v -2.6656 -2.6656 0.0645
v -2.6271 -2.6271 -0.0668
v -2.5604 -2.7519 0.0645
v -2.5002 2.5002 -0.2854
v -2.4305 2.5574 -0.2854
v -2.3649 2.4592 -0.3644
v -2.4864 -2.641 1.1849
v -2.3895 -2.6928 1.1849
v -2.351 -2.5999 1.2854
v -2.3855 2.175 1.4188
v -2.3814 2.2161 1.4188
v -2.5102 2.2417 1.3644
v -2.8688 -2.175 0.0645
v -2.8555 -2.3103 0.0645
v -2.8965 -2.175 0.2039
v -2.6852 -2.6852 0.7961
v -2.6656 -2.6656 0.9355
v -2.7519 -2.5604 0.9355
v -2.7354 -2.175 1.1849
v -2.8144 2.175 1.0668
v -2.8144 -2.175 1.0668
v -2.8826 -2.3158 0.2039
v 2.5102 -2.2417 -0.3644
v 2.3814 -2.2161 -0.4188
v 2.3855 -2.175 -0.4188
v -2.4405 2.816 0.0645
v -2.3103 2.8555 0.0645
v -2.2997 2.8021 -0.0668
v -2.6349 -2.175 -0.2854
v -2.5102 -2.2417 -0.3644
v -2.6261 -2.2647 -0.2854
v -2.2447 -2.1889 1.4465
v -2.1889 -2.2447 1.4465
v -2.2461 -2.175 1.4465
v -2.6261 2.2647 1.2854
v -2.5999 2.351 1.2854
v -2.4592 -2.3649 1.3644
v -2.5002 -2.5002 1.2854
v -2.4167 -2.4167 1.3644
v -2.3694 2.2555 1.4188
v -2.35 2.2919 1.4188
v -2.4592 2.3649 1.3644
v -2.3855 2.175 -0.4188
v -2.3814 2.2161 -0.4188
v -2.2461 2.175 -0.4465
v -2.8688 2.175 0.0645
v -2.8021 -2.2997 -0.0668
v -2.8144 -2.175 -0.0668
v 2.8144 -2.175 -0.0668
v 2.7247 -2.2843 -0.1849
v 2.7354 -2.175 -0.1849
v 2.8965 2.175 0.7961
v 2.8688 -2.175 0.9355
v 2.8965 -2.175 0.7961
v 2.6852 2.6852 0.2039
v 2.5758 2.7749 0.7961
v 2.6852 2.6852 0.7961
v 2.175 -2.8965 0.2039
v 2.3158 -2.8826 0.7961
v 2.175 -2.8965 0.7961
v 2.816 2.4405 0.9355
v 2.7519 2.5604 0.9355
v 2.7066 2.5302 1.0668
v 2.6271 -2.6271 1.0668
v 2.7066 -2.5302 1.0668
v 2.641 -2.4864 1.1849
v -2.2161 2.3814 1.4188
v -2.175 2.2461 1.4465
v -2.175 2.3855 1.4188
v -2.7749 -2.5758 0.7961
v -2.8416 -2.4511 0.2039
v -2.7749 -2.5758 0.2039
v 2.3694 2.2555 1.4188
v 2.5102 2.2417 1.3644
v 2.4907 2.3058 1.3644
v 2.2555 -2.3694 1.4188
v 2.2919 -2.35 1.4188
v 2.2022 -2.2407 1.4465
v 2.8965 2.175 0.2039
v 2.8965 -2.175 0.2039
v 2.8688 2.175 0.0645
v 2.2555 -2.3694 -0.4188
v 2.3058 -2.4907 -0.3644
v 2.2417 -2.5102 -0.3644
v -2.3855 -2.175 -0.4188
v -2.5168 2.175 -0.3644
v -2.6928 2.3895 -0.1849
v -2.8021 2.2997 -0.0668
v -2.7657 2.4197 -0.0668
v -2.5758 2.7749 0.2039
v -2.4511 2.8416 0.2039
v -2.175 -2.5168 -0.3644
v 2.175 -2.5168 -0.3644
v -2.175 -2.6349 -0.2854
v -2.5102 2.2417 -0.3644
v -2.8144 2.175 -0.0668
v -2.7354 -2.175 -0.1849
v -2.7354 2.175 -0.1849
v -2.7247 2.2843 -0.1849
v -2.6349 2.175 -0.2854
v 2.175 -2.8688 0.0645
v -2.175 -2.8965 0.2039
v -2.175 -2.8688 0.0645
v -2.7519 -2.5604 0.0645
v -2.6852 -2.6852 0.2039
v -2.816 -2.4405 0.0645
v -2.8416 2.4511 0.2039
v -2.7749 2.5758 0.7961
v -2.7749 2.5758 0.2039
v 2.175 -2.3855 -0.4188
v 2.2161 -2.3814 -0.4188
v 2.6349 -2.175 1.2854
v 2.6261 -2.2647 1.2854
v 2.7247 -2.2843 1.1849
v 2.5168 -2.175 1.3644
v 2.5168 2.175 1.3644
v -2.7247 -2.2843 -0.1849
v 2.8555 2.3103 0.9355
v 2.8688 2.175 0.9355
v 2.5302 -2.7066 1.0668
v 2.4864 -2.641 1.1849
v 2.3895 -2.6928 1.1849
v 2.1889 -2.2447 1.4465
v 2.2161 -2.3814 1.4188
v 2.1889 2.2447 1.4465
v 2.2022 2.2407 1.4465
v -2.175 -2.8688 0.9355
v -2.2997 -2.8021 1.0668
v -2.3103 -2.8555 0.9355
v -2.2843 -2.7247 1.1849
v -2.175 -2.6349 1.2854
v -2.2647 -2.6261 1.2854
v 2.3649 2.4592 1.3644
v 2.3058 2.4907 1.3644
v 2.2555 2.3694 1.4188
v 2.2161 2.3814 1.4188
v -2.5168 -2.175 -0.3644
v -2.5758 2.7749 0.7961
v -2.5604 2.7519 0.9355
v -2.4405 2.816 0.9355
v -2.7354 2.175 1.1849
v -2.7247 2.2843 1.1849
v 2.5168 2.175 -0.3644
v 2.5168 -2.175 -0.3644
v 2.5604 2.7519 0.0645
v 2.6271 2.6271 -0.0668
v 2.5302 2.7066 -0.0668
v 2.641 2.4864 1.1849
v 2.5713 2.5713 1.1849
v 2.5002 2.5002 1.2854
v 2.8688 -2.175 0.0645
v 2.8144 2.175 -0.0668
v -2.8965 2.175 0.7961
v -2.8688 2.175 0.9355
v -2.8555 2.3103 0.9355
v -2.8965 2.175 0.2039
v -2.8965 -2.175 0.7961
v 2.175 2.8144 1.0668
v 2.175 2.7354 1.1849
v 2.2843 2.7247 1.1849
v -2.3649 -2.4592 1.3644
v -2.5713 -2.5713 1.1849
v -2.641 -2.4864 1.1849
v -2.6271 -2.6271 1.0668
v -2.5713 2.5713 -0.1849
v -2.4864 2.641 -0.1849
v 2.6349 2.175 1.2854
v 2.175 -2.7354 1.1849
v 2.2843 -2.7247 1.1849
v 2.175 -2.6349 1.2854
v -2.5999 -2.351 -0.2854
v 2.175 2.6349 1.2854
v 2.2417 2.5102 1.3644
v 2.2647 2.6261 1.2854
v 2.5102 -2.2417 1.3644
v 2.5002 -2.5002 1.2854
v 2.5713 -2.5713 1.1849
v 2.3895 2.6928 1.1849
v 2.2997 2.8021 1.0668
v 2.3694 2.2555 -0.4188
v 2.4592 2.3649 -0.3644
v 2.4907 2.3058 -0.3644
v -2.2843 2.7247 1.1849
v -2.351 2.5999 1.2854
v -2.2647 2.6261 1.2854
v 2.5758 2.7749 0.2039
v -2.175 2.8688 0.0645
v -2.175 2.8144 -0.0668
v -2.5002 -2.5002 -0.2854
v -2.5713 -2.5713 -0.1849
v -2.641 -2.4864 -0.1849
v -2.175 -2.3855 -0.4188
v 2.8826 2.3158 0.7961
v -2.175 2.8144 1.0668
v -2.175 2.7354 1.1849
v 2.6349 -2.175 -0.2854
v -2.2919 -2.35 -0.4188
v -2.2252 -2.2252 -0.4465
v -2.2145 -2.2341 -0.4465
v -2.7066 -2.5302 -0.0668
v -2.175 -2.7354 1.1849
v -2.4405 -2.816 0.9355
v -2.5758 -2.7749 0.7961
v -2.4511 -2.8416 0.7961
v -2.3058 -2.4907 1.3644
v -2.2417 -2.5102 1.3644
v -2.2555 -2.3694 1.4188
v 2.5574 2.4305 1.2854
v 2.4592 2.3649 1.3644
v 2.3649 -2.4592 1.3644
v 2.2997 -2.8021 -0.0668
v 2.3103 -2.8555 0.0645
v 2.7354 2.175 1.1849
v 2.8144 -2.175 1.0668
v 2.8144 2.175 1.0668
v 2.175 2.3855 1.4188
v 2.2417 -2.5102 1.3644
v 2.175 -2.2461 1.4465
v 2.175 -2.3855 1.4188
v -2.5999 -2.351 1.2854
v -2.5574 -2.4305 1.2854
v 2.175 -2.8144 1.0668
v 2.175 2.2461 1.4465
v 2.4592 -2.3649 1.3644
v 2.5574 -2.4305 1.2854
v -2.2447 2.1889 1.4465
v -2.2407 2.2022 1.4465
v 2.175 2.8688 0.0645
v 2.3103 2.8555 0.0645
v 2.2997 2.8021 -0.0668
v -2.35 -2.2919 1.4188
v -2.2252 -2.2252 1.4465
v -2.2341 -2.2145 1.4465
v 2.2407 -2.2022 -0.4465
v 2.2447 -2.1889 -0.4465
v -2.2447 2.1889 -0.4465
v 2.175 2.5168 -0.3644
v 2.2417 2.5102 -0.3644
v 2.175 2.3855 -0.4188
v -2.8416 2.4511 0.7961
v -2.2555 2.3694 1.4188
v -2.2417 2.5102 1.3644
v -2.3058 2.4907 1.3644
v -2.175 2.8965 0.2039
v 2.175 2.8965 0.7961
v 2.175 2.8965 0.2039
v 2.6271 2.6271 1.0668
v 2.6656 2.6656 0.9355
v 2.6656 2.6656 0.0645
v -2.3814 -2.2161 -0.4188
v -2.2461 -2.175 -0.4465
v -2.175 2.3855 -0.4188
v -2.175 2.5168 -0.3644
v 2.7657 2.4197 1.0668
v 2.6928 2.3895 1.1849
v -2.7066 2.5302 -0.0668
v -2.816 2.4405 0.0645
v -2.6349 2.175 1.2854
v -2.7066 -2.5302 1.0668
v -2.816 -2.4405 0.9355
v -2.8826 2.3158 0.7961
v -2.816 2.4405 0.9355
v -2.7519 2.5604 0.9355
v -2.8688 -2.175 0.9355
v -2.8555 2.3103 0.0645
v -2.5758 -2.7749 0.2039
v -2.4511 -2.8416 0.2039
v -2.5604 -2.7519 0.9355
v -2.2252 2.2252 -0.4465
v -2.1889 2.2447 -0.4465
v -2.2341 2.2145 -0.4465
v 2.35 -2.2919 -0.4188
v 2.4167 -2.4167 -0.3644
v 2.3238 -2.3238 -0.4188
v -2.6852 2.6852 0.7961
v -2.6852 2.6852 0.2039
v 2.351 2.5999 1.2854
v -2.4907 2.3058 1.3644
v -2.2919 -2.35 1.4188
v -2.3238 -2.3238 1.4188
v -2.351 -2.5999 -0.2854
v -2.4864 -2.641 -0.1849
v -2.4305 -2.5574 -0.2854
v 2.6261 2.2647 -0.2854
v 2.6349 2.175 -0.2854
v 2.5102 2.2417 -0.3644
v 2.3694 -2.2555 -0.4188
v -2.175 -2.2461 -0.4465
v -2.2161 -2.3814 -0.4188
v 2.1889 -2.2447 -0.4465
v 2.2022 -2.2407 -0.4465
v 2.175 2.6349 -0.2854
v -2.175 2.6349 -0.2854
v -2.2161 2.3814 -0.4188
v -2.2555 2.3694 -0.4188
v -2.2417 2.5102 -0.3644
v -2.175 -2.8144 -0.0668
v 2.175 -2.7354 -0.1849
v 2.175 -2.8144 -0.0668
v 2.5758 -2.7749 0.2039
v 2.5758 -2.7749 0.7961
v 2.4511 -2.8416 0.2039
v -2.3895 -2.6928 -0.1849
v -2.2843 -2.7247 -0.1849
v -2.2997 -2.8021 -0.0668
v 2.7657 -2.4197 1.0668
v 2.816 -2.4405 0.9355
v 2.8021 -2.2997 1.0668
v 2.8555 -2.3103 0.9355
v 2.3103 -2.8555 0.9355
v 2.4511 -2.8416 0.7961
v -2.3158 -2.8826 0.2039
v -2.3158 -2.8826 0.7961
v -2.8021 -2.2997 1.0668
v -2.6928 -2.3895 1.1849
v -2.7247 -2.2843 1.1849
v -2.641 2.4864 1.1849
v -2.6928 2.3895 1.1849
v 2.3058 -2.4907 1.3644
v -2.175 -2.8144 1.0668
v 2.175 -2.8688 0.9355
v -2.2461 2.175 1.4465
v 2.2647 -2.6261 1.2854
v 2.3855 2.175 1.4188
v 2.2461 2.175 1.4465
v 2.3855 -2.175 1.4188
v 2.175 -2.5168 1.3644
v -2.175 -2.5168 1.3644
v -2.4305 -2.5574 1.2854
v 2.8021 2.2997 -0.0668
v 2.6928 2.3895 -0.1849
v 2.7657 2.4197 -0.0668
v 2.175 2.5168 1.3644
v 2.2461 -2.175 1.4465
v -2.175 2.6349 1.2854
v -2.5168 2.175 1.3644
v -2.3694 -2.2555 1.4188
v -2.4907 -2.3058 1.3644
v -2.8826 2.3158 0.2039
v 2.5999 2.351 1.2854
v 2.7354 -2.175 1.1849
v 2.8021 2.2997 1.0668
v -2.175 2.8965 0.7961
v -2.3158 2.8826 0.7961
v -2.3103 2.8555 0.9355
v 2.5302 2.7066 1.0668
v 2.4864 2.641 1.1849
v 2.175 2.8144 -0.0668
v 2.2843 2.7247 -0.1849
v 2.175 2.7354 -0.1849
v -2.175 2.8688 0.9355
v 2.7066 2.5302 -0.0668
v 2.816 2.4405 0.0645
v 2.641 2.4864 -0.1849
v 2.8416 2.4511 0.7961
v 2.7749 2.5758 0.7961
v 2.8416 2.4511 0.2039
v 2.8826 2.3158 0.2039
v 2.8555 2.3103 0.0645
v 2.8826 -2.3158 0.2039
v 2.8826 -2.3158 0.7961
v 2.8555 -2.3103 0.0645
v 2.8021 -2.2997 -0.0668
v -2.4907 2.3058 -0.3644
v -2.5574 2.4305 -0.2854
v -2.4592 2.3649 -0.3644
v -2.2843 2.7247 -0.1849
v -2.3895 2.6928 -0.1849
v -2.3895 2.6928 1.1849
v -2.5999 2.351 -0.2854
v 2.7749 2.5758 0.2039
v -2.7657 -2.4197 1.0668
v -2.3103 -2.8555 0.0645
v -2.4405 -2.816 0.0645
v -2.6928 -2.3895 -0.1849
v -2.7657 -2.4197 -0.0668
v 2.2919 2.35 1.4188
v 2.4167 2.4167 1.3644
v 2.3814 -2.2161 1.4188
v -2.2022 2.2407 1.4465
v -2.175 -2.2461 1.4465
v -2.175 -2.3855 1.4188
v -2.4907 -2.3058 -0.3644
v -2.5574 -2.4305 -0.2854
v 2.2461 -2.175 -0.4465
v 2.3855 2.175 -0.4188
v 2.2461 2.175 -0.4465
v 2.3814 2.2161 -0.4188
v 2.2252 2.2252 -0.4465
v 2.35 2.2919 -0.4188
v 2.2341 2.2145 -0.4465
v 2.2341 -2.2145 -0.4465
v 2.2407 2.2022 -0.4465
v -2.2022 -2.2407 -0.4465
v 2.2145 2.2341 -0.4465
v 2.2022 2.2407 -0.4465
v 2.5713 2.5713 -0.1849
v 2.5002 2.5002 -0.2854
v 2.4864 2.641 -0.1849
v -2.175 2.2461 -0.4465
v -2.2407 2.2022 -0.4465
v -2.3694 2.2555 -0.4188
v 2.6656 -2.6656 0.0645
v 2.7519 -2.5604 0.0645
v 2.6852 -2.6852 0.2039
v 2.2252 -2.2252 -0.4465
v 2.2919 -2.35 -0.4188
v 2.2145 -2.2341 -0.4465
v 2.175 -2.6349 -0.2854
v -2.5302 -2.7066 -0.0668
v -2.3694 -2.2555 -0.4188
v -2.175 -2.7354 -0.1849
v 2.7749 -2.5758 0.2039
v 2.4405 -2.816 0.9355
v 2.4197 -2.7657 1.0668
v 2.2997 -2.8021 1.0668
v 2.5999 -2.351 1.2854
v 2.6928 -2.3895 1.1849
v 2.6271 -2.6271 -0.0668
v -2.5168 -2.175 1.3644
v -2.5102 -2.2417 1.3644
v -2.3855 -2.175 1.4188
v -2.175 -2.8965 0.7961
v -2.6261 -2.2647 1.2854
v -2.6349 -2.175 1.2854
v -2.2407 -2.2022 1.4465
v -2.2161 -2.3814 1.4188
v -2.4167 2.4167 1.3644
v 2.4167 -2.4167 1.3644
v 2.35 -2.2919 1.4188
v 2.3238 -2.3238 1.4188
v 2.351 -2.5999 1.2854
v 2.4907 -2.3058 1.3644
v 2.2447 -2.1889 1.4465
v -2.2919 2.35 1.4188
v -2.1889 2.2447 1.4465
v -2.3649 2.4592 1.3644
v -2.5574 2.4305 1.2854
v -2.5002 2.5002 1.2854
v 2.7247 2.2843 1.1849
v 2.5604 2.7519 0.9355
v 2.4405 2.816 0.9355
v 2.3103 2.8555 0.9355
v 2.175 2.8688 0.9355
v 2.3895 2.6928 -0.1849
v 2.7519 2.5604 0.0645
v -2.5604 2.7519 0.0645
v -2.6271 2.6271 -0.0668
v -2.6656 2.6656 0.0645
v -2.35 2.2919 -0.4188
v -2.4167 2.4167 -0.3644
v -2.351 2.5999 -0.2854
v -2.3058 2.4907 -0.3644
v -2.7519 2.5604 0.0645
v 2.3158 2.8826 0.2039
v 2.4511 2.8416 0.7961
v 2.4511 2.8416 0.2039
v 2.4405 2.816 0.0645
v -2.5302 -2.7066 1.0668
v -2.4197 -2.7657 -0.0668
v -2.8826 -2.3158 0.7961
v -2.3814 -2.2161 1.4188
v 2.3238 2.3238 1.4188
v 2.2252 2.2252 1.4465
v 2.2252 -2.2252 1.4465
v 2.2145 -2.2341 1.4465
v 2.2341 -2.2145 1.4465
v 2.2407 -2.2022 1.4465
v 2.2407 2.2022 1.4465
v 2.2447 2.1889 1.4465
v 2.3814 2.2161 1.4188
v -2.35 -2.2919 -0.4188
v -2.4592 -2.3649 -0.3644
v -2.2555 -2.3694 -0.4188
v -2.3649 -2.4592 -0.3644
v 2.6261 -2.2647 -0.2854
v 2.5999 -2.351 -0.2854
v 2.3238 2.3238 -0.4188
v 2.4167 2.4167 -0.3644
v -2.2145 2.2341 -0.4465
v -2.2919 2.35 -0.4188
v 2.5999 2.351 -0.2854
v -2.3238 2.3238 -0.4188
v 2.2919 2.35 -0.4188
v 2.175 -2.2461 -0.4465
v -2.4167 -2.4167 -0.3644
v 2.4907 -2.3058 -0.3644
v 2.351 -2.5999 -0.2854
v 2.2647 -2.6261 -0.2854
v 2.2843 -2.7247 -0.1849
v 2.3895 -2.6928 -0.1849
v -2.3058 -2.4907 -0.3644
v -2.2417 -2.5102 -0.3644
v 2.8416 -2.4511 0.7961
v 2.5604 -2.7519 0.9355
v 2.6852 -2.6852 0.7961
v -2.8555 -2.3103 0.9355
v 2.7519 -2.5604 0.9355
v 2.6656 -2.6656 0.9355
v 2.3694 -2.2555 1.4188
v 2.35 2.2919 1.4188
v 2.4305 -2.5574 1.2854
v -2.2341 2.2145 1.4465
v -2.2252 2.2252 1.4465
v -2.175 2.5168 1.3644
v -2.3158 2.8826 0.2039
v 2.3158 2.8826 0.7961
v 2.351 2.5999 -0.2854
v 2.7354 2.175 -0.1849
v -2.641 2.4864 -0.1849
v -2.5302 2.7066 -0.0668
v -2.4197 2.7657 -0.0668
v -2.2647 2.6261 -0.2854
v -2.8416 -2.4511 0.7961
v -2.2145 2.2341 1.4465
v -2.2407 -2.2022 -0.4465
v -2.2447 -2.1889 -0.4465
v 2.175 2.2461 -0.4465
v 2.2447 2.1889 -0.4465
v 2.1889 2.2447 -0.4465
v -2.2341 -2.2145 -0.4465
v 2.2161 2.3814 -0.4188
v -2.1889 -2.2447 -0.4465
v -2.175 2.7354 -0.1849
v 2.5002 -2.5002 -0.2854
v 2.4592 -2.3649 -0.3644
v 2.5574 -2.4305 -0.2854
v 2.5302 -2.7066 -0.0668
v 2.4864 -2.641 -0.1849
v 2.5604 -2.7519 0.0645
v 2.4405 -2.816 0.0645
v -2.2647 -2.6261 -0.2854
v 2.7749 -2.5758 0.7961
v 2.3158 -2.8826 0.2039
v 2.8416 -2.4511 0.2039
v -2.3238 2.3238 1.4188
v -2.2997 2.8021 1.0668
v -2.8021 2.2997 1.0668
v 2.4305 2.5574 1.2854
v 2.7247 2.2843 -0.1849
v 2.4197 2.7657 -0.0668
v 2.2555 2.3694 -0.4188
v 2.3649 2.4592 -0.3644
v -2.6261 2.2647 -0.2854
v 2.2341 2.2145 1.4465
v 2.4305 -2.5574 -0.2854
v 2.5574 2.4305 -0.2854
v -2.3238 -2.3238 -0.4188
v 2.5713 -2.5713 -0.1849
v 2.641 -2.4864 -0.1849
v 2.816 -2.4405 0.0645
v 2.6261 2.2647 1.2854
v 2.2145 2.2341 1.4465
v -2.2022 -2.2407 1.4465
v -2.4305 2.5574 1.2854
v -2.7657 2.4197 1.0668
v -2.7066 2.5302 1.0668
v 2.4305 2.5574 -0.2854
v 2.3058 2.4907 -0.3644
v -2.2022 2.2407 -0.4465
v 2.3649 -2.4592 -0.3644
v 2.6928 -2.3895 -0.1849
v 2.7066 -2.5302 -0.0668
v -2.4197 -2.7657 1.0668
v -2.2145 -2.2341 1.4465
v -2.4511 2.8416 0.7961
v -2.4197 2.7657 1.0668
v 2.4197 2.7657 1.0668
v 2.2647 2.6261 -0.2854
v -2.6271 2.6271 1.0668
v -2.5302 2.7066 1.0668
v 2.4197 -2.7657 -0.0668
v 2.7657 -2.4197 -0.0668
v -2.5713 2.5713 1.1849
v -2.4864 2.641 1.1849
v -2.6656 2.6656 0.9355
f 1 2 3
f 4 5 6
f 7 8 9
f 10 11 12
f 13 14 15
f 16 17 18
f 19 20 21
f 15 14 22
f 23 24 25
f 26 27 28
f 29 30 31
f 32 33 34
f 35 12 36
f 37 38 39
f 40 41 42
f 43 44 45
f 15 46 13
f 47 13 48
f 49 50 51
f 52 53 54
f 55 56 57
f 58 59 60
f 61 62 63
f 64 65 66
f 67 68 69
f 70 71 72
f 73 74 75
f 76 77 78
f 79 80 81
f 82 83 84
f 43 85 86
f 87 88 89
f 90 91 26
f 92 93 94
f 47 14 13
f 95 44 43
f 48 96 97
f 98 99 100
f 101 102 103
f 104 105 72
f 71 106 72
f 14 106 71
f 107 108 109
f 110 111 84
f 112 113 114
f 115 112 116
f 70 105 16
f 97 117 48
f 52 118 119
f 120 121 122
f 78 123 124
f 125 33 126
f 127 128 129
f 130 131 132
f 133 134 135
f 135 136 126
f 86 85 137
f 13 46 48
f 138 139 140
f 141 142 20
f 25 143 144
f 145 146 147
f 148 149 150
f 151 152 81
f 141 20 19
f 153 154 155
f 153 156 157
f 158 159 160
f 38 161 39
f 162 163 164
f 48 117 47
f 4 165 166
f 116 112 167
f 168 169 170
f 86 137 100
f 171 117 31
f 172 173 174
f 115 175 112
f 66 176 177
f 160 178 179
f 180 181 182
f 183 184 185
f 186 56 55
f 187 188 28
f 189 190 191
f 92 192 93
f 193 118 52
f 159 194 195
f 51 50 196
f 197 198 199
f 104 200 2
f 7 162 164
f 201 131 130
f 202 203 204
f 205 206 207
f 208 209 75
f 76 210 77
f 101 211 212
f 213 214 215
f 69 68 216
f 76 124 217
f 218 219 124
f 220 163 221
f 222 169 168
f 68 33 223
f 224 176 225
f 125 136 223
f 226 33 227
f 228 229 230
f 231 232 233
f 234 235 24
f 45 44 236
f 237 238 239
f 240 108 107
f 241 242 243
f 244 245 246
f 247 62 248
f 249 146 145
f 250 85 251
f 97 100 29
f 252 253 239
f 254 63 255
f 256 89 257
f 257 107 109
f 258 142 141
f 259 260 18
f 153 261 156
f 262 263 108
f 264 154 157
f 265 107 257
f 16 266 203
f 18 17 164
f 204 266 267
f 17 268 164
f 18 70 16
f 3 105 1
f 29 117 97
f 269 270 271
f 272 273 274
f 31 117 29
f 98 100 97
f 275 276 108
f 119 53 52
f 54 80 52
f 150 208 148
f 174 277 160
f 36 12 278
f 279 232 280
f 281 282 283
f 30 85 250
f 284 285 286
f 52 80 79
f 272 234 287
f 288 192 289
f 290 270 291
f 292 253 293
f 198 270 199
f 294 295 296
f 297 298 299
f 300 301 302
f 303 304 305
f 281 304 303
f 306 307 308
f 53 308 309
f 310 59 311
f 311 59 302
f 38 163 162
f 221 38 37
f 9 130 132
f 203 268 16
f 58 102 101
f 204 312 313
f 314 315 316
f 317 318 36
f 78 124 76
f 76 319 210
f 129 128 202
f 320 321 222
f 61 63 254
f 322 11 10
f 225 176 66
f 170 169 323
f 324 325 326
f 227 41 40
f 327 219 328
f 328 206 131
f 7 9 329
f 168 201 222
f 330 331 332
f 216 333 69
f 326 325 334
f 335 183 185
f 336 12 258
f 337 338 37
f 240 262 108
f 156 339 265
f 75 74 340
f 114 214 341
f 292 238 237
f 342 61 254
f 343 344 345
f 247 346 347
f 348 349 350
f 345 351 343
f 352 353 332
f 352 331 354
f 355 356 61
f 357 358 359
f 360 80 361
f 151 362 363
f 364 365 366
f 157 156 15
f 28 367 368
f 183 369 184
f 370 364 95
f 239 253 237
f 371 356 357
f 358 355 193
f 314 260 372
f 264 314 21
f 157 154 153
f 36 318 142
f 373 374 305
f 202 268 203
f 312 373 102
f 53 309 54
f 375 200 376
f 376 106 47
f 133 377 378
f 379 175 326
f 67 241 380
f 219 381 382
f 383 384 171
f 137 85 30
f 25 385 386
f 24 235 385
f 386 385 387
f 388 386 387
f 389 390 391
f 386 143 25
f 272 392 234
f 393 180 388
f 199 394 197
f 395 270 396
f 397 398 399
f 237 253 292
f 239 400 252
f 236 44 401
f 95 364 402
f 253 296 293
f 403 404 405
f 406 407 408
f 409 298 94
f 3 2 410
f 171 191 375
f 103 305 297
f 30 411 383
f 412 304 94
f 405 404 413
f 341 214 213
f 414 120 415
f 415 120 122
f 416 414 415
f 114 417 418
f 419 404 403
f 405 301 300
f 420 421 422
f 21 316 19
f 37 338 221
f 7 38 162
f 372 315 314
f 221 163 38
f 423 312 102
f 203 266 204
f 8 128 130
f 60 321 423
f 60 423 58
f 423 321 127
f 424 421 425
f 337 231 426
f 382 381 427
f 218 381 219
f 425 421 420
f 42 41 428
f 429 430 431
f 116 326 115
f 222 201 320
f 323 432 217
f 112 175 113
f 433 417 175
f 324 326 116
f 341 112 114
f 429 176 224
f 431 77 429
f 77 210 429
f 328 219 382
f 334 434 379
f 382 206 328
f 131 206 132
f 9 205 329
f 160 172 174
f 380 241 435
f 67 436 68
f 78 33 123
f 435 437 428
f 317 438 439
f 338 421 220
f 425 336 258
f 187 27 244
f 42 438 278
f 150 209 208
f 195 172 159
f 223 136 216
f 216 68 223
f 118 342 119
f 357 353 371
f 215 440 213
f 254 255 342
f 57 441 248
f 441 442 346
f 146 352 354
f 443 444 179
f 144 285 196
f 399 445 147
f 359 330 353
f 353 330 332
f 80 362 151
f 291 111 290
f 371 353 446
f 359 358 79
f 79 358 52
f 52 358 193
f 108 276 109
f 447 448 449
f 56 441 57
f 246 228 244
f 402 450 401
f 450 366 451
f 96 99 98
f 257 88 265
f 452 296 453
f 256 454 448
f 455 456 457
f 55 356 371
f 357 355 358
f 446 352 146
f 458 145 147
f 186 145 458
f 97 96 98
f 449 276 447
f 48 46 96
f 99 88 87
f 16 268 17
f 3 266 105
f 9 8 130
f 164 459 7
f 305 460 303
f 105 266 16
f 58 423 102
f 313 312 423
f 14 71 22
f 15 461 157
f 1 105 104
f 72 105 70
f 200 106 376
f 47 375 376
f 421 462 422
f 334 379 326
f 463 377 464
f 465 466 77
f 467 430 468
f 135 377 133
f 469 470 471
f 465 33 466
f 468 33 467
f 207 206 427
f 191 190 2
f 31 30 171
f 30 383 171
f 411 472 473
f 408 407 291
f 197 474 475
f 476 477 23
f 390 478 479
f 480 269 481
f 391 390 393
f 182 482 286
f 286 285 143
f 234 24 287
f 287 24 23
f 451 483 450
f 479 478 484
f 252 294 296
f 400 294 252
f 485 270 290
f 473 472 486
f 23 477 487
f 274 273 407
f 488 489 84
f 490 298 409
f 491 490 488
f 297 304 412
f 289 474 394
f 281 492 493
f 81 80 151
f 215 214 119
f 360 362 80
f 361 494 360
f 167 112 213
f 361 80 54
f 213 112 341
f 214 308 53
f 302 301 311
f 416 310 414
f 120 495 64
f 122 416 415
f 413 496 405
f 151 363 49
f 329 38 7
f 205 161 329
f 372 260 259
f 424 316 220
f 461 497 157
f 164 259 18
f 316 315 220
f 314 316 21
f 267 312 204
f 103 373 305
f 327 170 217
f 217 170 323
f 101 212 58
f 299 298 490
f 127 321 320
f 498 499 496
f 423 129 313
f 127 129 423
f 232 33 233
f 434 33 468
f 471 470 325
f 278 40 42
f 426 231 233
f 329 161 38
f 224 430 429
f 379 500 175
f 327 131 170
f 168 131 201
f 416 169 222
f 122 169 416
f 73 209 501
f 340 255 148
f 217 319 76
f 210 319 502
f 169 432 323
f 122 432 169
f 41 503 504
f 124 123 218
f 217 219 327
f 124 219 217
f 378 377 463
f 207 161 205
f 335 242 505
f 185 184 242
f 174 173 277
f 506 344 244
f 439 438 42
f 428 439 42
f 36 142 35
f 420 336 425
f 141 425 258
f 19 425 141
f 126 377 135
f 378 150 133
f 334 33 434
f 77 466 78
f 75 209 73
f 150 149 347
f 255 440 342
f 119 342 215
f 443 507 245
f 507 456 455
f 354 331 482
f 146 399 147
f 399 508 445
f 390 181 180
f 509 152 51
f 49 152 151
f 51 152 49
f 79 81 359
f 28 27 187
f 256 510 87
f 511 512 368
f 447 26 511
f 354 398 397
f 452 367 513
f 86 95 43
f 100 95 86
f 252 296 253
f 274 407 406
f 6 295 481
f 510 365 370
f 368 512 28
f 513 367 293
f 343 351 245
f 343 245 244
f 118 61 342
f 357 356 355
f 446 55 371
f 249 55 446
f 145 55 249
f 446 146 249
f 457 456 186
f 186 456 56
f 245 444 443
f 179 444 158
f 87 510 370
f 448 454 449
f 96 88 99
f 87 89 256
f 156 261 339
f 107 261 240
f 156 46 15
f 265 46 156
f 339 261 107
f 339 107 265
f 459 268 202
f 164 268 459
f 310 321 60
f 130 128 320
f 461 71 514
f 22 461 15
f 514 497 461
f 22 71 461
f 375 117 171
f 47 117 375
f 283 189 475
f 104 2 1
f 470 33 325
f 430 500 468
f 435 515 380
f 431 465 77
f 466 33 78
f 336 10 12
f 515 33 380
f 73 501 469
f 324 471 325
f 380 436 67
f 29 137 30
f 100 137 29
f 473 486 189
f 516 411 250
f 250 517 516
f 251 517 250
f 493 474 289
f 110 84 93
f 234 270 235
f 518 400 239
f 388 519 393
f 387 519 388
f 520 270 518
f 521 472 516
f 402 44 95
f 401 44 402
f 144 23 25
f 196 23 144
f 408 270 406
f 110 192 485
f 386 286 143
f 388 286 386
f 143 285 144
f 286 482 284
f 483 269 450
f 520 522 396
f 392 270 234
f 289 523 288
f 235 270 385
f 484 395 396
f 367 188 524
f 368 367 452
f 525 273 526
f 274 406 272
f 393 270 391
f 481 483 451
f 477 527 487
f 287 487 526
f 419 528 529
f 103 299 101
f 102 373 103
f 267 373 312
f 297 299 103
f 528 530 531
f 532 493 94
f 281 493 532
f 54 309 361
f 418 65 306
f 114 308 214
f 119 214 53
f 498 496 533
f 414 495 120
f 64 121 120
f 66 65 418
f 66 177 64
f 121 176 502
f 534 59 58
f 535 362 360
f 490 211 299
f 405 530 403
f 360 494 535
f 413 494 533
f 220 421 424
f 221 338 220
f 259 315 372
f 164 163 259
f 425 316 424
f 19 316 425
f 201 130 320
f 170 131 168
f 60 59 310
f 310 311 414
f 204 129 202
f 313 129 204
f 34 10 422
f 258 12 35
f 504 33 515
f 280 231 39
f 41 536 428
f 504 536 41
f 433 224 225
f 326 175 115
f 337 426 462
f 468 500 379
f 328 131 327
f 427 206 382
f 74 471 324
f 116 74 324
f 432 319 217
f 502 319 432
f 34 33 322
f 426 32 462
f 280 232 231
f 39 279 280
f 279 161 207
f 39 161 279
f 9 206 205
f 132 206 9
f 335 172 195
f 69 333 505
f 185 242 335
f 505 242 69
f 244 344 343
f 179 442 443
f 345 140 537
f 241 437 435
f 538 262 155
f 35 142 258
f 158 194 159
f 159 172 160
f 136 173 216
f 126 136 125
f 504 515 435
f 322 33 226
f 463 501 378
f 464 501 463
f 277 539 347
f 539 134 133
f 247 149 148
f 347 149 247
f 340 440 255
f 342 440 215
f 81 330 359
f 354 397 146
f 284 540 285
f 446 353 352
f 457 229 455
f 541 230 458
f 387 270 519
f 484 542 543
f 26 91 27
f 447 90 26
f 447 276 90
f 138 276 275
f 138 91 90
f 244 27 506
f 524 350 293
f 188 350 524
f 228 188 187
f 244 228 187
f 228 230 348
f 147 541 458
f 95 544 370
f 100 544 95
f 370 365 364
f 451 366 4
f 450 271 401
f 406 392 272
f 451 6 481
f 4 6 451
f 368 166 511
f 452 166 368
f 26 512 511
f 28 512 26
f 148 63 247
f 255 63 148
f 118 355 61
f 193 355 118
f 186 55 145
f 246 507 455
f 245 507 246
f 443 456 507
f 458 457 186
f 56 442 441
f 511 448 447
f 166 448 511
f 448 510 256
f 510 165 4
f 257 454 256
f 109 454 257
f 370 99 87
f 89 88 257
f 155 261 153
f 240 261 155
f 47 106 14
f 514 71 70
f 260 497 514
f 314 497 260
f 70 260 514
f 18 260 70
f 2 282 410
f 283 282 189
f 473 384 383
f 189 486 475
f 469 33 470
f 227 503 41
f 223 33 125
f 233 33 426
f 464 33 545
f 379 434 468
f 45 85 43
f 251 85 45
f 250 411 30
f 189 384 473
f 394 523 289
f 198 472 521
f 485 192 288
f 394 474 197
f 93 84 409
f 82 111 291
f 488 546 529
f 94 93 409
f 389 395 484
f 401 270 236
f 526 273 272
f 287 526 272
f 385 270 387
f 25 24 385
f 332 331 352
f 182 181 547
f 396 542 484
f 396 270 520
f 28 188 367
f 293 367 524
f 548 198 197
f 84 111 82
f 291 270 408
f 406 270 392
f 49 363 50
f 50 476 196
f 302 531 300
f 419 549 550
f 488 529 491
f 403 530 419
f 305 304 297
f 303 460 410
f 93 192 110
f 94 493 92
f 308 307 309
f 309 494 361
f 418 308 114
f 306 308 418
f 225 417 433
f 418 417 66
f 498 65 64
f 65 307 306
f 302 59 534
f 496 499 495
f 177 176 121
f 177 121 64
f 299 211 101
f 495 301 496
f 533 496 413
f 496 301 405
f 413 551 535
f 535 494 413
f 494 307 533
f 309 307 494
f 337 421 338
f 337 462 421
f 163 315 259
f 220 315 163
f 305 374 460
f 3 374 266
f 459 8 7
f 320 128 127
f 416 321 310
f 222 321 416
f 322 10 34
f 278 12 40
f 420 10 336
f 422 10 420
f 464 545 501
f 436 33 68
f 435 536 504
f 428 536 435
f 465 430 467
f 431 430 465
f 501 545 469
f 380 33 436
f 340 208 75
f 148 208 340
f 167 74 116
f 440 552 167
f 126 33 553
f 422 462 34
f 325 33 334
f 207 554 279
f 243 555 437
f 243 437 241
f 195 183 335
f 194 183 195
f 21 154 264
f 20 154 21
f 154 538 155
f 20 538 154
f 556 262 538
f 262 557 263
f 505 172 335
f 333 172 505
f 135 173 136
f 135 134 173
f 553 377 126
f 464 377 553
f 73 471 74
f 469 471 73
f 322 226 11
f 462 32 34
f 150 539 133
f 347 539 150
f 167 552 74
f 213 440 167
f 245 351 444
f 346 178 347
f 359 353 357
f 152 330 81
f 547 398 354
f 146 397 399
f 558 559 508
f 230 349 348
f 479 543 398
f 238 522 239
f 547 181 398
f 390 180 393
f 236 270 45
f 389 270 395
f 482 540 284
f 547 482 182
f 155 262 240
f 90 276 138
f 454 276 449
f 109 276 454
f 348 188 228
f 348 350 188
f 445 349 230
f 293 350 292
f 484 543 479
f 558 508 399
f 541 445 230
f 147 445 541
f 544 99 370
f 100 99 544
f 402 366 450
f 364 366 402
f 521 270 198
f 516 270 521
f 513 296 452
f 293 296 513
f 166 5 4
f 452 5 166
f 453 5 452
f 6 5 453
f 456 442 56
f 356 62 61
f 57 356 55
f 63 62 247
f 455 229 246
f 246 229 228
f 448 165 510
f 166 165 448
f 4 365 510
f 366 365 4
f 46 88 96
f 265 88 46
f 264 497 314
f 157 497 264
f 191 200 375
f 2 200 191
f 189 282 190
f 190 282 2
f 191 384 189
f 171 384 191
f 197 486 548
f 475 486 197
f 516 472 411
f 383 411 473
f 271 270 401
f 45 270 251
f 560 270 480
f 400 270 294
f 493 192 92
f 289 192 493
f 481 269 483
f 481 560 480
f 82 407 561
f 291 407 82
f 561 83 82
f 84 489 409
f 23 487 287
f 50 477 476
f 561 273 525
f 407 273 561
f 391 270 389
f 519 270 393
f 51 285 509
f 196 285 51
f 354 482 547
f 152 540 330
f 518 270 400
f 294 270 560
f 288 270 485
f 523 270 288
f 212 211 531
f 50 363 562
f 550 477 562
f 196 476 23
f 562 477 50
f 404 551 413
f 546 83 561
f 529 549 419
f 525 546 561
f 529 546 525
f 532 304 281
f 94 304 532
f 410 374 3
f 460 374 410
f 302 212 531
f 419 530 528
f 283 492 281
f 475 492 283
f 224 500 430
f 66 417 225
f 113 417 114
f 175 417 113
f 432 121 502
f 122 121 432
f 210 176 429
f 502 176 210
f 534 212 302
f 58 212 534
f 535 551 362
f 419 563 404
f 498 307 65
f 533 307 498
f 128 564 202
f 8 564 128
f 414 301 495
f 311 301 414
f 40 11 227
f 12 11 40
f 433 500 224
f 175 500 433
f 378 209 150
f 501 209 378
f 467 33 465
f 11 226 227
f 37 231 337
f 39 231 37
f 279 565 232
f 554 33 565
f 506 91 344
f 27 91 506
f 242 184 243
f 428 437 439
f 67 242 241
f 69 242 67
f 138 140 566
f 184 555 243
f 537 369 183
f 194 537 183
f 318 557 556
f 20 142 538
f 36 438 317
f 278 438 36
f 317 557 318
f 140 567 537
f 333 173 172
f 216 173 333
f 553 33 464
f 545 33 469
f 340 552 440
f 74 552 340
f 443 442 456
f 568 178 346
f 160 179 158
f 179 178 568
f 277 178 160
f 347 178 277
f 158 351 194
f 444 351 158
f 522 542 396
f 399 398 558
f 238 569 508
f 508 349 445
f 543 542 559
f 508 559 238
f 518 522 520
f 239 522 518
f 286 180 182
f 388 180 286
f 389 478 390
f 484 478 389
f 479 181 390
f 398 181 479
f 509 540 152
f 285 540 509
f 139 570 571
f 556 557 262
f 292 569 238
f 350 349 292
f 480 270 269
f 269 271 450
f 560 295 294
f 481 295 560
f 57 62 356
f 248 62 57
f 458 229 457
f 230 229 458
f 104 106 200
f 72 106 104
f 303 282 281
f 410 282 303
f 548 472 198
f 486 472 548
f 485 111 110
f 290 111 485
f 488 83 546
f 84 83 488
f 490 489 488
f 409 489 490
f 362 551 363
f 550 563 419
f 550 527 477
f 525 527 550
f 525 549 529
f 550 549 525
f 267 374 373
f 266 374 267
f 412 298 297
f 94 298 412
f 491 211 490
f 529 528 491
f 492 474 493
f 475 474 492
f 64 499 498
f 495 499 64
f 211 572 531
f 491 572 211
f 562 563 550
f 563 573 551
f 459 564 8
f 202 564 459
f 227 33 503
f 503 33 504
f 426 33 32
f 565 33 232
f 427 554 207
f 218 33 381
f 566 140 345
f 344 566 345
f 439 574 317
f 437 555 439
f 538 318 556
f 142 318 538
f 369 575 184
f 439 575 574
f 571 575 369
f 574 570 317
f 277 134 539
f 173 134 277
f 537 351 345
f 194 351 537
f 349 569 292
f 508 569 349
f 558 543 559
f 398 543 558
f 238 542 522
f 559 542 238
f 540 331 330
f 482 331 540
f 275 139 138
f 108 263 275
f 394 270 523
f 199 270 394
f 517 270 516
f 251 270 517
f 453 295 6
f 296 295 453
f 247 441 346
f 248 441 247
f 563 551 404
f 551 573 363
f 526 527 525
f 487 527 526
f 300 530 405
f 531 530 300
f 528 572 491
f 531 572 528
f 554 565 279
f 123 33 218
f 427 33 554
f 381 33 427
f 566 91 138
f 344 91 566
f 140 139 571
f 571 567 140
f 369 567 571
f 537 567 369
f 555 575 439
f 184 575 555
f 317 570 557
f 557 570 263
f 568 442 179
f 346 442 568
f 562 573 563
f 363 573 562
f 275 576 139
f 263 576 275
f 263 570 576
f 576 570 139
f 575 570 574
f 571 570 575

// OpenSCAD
// LED 5mm (5mm LED) visual source for NexCAD.
// Units: millimeters. Origin: part bottom-center, matching src/parts/library.ts.
// This generated baseline is intentionally simple; refine it with measured details before exporting STL.

$fn = 32;

module rounded_box(size, r = 0.8) {
  hull() {
    for (x = [-size[0] / 2 + r, size[0] / 2 - r])
      for (y = [-size[1] / 2 + r, size[1] / 2 - r]) {
        translate([x, y, r]) sphere(r = r);
        translate([x, y, size[2] - r]) sphere(r = r);
      }
  }
}

color("#2e7d5b") rounded_box([5.8, 5.8, 1], min(1.2, min(5.8, 5.8) / 8));
